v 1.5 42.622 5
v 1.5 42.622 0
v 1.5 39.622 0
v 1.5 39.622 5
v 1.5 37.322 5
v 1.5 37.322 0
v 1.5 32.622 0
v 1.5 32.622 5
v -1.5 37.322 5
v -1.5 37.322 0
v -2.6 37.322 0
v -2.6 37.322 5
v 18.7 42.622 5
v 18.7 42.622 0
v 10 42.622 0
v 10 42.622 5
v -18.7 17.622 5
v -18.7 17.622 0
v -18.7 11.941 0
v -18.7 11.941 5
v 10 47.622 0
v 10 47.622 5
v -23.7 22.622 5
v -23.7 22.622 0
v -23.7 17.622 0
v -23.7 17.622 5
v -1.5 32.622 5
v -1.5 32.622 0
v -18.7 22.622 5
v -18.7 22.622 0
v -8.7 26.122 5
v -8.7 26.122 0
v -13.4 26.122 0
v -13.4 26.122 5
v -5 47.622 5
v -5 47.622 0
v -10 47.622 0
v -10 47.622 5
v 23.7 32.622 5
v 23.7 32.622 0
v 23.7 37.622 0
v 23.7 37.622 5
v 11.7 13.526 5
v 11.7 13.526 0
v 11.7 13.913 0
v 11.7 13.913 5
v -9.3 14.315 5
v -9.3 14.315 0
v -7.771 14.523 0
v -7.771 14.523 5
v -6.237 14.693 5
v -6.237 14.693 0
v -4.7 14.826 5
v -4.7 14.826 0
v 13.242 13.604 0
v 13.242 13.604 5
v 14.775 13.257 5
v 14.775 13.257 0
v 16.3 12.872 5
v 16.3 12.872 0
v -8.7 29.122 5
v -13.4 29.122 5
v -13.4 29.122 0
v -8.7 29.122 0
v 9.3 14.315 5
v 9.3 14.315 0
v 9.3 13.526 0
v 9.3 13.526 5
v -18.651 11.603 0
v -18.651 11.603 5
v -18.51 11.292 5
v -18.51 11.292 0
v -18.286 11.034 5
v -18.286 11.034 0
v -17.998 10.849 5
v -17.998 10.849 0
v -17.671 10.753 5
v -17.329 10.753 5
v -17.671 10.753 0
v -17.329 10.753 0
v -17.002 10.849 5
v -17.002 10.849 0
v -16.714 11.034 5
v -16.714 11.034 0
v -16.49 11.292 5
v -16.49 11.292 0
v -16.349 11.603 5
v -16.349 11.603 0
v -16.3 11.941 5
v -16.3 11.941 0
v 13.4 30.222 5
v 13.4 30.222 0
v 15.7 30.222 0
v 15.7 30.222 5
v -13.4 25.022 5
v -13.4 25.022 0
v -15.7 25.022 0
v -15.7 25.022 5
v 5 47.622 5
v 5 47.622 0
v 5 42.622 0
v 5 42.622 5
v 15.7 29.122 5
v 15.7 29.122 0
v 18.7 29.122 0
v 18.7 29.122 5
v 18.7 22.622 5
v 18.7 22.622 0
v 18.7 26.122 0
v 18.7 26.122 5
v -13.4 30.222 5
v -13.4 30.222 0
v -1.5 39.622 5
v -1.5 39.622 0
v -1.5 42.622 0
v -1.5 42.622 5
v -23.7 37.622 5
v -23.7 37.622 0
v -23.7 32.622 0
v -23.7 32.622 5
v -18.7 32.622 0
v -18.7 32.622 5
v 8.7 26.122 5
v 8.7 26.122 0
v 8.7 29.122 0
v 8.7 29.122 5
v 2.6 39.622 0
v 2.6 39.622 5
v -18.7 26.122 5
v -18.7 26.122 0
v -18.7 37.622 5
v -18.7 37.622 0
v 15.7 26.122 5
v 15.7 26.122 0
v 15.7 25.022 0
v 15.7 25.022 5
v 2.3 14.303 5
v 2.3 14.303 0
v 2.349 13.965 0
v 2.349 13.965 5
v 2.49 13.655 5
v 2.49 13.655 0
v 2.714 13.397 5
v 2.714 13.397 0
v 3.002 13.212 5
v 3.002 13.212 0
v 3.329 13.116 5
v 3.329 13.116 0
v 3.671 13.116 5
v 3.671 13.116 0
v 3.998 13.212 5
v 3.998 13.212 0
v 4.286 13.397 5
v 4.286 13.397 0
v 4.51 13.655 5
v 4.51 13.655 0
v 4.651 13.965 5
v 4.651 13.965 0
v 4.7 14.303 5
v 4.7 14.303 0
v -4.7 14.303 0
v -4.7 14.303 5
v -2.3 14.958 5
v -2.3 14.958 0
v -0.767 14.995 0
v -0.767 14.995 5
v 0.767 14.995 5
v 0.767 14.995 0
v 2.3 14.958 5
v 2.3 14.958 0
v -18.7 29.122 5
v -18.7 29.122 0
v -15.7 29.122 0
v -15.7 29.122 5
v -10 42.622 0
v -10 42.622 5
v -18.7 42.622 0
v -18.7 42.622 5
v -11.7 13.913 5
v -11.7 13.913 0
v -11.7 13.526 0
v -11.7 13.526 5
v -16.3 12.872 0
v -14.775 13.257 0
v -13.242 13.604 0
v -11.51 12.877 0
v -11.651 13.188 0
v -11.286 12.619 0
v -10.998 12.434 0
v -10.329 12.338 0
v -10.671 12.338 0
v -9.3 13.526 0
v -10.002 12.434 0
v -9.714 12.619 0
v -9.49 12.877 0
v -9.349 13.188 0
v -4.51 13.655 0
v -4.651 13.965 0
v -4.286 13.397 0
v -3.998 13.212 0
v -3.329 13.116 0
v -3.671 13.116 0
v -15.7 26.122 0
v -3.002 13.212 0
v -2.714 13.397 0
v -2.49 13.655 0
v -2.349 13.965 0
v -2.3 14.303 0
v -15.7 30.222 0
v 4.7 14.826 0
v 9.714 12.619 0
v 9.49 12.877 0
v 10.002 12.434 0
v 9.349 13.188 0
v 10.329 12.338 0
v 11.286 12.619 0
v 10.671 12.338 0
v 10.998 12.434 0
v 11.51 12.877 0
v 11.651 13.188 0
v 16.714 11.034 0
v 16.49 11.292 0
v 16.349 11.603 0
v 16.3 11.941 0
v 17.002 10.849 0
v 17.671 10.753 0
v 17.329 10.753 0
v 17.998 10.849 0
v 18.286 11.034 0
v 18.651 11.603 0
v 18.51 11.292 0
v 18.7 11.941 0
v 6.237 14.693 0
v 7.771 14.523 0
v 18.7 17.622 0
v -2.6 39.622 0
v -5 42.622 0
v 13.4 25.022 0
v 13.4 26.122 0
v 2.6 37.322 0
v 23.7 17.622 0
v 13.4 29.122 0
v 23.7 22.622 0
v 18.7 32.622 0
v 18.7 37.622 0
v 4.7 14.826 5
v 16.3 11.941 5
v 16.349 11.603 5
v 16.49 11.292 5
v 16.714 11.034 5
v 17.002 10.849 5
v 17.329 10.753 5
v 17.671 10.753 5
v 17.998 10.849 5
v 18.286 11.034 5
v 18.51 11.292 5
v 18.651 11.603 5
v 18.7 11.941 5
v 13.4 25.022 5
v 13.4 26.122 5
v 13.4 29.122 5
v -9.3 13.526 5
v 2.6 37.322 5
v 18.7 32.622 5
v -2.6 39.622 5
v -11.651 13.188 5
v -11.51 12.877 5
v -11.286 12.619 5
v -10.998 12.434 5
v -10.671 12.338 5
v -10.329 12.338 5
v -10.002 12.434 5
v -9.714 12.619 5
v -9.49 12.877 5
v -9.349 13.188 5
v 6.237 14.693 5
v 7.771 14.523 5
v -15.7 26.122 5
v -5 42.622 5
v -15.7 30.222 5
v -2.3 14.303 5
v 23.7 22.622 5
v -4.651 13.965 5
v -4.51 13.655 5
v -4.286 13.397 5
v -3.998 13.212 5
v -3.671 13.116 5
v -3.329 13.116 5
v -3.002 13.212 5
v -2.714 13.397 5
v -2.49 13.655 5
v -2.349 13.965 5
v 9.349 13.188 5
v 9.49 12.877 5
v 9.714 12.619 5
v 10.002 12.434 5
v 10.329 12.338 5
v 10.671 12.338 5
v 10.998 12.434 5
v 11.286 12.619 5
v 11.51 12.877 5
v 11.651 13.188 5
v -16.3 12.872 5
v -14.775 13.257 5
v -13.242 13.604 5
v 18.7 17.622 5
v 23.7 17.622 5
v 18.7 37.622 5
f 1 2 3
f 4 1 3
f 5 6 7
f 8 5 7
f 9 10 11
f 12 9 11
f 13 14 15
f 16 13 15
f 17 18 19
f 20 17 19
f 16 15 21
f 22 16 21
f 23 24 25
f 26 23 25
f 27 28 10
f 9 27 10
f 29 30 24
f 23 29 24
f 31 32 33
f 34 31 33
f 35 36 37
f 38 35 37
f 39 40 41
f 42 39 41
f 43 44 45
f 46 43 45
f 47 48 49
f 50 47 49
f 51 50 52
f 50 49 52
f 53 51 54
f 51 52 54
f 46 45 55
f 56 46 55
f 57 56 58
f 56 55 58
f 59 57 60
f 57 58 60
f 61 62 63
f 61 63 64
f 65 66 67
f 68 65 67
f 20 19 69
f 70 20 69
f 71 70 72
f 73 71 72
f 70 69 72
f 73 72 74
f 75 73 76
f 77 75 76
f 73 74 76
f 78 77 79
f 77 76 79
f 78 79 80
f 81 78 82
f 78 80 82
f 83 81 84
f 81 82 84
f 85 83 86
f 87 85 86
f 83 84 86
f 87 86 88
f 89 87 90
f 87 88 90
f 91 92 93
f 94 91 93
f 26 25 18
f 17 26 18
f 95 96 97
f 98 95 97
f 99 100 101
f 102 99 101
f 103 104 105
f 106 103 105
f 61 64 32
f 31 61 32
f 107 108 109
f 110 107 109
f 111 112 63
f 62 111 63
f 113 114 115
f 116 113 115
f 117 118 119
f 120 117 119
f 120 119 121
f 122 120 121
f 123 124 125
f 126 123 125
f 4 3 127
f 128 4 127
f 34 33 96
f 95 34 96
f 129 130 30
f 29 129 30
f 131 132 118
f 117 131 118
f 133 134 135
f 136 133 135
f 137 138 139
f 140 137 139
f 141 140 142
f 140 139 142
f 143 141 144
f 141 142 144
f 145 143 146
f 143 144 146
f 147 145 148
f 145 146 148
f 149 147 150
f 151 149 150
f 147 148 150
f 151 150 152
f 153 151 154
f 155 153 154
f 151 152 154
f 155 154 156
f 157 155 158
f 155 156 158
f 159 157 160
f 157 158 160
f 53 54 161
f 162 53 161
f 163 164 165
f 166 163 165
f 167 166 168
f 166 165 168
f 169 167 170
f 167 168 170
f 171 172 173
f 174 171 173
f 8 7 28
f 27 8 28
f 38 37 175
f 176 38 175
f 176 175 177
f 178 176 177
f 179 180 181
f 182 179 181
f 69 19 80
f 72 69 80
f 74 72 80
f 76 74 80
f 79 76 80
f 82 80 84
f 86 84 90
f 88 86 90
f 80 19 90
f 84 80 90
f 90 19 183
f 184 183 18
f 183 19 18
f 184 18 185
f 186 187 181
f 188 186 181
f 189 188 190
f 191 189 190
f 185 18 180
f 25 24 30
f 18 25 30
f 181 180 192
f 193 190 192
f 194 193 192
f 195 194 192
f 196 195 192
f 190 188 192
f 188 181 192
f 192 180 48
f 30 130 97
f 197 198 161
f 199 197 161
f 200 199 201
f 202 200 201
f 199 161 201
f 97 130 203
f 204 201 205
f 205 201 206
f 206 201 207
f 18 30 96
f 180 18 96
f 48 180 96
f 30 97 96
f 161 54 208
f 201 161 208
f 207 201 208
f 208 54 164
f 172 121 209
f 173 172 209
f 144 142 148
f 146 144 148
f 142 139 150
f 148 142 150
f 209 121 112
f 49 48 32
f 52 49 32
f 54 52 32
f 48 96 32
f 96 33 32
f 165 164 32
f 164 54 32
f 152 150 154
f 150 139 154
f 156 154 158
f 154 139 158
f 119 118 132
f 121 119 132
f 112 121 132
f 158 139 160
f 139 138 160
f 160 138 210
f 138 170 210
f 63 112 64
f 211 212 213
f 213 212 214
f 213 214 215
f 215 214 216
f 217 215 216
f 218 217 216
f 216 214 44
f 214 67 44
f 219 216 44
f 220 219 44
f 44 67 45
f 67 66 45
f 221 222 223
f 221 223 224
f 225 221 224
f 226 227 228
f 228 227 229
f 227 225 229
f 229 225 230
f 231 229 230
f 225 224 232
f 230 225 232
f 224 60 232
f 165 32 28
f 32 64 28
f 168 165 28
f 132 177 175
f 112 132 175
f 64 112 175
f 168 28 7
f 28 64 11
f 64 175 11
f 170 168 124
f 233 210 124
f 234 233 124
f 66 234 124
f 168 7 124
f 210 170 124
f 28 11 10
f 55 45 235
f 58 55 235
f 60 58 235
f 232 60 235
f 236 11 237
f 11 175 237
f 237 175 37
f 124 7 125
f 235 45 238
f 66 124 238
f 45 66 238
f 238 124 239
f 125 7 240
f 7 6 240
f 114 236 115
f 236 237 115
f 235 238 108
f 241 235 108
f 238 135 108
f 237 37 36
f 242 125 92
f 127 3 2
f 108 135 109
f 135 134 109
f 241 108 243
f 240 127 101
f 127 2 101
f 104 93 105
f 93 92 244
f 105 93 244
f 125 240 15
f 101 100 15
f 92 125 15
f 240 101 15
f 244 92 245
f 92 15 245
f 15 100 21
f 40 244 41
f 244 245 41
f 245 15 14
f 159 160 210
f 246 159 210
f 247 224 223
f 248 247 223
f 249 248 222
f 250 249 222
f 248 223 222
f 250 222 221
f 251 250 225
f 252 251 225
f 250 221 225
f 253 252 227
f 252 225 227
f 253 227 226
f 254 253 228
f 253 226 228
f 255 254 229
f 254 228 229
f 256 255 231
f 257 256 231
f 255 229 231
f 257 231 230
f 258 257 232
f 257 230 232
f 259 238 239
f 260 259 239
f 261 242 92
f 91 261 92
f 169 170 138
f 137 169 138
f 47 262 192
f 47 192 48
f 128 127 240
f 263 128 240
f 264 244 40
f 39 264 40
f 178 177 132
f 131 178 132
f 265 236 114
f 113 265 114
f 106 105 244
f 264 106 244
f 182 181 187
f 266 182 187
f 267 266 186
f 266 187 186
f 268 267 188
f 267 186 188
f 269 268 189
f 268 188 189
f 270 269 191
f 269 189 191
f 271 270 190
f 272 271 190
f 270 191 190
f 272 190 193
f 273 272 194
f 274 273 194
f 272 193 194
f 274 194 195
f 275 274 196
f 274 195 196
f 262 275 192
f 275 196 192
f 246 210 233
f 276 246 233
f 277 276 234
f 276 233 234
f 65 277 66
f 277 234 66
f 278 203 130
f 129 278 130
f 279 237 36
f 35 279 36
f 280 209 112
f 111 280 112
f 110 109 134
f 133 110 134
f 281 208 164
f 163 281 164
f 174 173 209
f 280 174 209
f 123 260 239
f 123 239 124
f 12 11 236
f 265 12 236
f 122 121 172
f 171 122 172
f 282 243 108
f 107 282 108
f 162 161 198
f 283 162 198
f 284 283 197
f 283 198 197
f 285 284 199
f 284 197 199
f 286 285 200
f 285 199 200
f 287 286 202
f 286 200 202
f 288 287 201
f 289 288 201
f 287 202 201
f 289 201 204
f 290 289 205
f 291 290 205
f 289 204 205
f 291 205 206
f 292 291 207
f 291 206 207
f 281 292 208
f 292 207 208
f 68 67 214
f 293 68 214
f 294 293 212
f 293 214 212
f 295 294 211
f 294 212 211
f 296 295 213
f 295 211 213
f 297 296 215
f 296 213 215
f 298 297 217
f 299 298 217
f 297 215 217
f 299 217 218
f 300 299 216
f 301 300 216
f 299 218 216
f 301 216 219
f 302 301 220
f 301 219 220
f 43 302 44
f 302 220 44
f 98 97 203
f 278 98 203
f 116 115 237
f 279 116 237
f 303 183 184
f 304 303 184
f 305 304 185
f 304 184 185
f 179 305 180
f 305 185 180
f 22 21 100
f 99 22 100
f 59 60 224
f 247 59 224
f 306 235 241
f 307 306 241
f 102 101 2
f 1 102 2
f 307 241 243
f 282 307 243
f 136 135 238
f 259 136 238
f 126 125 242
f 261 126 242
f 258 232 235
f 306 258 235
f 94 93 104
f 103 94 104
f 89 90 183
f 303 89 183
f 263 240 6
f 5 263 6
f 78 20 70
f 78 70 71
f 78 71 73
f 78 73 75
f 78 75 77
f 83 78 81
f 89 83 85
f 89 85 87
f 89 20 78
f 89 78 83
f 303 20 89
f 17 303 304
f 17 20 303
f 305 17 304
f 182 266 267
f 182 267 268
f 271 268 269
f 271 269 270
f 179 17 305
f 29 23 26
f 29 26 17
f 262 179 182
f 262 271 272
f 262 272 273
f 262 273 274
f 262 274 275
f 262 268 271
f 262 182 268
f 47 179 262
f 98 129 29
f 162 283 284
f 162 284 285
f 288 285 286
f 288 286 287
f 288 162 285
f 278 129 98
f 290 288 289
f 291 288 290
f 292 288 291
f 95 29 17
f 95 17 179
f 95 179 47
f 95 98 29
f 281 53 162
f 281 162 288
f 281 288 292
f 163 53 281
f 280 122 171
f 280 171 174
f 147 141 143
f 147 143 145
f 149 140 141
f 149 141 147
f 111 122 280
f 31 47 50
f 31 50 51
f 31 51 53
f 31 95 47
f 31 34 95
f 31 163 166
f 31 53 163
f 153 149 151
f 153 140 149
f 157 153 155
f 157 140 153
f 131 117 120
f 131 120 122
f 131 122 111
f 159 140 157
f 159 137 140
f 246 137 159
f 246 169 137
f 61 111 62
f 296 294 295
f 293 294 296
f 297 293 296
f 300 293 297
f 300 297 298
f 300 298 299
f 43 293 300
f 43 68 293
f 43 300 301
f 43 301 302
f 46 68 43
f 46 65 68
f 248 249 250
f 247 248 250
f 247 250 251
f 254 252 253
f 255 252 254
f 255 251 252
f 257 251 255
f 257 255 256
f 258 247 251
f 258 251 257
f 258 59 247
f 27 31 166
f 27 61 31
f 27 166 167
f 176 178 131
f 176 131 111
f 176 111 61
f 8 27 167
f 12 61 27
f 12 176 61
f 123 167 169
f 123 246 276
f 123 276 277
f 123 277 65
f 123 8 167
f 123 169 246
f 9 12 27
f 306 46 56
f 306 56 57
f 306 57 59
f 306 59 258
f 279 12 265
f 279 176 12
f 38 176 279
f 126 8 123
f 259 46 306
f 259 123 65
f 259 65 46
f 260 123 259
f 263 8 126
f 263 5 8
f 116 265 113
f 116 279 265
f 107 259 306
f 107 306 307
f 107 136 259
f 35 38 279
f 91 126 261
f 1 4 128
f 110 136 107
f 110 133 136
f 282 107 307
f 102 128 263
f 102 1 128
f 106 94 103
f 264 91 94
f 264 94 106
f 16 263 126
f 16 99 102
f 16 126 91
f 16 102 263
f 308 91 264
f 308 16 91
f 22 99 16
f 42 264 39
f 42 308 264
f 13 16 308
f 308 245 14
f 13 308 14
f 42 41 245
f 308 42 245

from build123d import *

# Parameters (mm, degrees)
BOSS_EXTRUDE1_DEPTH = 5


with BuildPart() as part:
    # Sketch1 → Boss-Extrude1 (new body)
    with BuildSketch(Plane.XY):
        with BuildLine():
            Line((-18.7, 12.184100059), (-18.7, 11.940969848))
            ThreePointArc((-18.7, 11.940969848), (-17.5, 10.740969848), (-16.3, 11.940969848))
            Line((-16.3, 11.940969848), (-16.3, 12.872306458))
            ThreePointArc((-16.3, 12.872306458), (-14.009663332, 13.435283428), (-11.7, 13.912819196))
            Line((-11.7, 13.912819196), (-11.7, 13.525873247))
            ThreePointArc((-11.7, 13.525873247), (-10.5, 12.325873247), (-9.3, 13.525873247))
            Line((-9.3, 13.525873247), (-9.3, 14.315284764))
            ThreePointArc((-9.3, 14.315284764), (-7.004652926, 14.612477668), (-4.7, 14.825824116))
            Line((-4.7, 14.825824116), (-4.7, 14.303469937))
            ThreePointArc((-4.7, 14.303469937), (-3.5, 13.103469937), (-2.3, 14.303469937))
            Line((-2.3, 14.303469937), (-2.3, 14.958332786))
            ThreePointArc((-2.3, 14.958332786), (0, 15), (2.3, 14.958332786))
            Line((2.3, 14.958332786), (2.3, 14.303469937))
            ThreePointArc((2.3, 14.303469937), (3.5, 13.103469937), (4.7, 14.303469937))
            Line((4.7, 14.303469937), (4.7, 14.825824116))
            ThreePointArc((4.7, 14.825824116), (7.004652926, 14.612477668), (9.3, 14.315284764))
            Line((9.3, 14.315284764), (9.3, 13.525873247))
            ThreePointArc((9.3, 13.525873247), (10.5, 12.325873247), (11.7, 13.525873247))
            Line((11.7, 13.525873247), (11.7, 13.912819196))
            ThreePointArc((11.7, 13.912819196), (14.009663332, 13.435283428), (16.3, 12.872306458))
            Line((16.3, 12.872306458), (16.3, 11.940969848))
            ThreePointArc((16.3, 11.940969848), (17.5, 10.740969848), (18.7, 11.940969848))
            Line((18.7, 11.940969848), (18.7, 12.184100059))
            Line((18.7, 12.184100059), (18.7, 17.622423299))
            Line((18.7, 17.622423299), (23.7, 17.622423299))
            Line((23.7, 17.622423299), (23.7, 22.622423299))
            Line((23.7, 22.622423299), (18.7, 22.622423299))
            Line((18.7, 22.622423299), (18.7, 26.122423299))
            Line((18.7, 26.122423299), (15.7, 26.122423299))
            Line((15.7, 26.122423299), (15.7, 25.022423299))
            Line((15.7, 25.022423299), (13.4, 25.022423299))
            Line((13.4, 25.022423299), (13.4, 26.122423299))
            Line((13.4, 26.122423299), (8.7, 26.122423299))
            Line((8.7, 26.122423299), (8.7, 29.122423299))
            Line((8.7, 29.122423299), (13.4, 29.122423299))
            Line((13.4, 29.122423299), (13.4, 30.222423299))
            Line((13.4, 30.222423299), (15.7, 30.222423299))
            Line((15.7, 30.222423299), (15.7, 29.122423299))
            Line((15.7, 29.122423299), (18.7, 29.122423299))
            Line((18.7, 29.122423299), (18.7, 32.622423299))
            Line((18.7, 32.622423299), (23.7, 32.622423299))
            Line((23.7, 32.622423299), (23.7, 37.622423299))
            Line((23.7, 37.622423299), (18.7, 37.622423299))
            Line((18.7, 37.622423299), (18.7, 42.622423299))
            Line((18.7, 42.622423299), (10, 42.622423299))
            Line((10, 42.622423299), (10, 47.622423299))
            Line((10, 47.622423299), (5, 47.622423299))
            Line((5, 47.622423299), (5, 42.622423299))
            Line((5, 42.622423299), (1.5, 42.622423299))
            Line((1.5, 42.622423299), (1.5, 39.622423299))
            Line((1.5, 39.622423299), (2.6, 39.622423299))
            Line((2.6, 39.622423299), (2.6, 37.322423299))
            Line((2.6, 37.322423299), (1.5, 37.322423299))
            Line((1.5, 37.322423299), (1.5, 32.622423299))
            Line((1.5, 32.622423299), (-1.5, 32.622423299))
            Line((-1.5, 32.622423299), (-1.5, 37.322423299))
            Line((-1.5, 37.322423299), (-2.6, 37.322423299))
            Line((-2.6, 37.322423299), (-2.6, 39.622423299))
            Line((-2.6, 39.622423299), (-1.5, 39.622423299))
            Line((-1.5, 39.622423299), (-1.5, 42.622423299))
            Line((-1.5, 42.622423299), (-5, 42.622423299))
            Line((-5, 42.622423299), (-5, 47.622423299))
            Line((-5, 47.622423299), (-10, 47.622423299))
            Line((-10, 47.622423299), (-10, 42.622423299))
            Line((-10, 42.622423299), (-18.7, 42.622423299))
            Line((-18.7, 42.622423299), (-18.7, 37.622423299))
            Line((-18.7, 37.622423299), (-23.7, 37.622423299))
            Line((-23.7, 37.622423299), (-23.7, 32.622423299))
            Line((-23.7, 32.622423299), (-18.7, 32.622423299))
            Line((-18.7, 32.622423299), (-18.7, 29.122423299))
            Line((-18.7, 29.122423299), (-15.7, 29.122423299))
            Line((-15.7, 29.122423299), (-15.7, 30.222423299))
            Line((-15.7, 30.222423299), (-13.4, 30.222423299))
            Line((-13.4, 30.222423299), (-13.4, 29.122423299))
            Line((-13.4, 29.122423299), (-8.7, 29.122423299))
            Line((-8.7, 29.122423299), (-8.7, 26.122423299))
            Line((-8.7, 26.122423299), (-13.4, 26.122423299))
            Line((-13.4, 26.122423299), (-13.4, 25.022423299))
            Line((-13.4, 25.022423299), (-15.7, 25.022423299))
            Line((-15.7, 25.022423299), (-15.7, 26.122423299))
            Line((-15.7, 26.122423299), (-18.7, 26.122423299))
            Line((-18.7, 26.122423299), (-18.7, 22.622423299))
            Line((-18.7, 22.622423299), (-23.7, 22.622423299))
            Line((-23.7, 22.622423299), (-23.7, 17.622423299))
            Line((-23.7, 17.622423299), (-18.7, 17.622423299))
            Line((-18.7, 17.622423299), (-18.7, 12.184100059))
        make_face()
    extrude(amount=BOSS_EXTRUDE1_DEPTH)


solid = part.part
